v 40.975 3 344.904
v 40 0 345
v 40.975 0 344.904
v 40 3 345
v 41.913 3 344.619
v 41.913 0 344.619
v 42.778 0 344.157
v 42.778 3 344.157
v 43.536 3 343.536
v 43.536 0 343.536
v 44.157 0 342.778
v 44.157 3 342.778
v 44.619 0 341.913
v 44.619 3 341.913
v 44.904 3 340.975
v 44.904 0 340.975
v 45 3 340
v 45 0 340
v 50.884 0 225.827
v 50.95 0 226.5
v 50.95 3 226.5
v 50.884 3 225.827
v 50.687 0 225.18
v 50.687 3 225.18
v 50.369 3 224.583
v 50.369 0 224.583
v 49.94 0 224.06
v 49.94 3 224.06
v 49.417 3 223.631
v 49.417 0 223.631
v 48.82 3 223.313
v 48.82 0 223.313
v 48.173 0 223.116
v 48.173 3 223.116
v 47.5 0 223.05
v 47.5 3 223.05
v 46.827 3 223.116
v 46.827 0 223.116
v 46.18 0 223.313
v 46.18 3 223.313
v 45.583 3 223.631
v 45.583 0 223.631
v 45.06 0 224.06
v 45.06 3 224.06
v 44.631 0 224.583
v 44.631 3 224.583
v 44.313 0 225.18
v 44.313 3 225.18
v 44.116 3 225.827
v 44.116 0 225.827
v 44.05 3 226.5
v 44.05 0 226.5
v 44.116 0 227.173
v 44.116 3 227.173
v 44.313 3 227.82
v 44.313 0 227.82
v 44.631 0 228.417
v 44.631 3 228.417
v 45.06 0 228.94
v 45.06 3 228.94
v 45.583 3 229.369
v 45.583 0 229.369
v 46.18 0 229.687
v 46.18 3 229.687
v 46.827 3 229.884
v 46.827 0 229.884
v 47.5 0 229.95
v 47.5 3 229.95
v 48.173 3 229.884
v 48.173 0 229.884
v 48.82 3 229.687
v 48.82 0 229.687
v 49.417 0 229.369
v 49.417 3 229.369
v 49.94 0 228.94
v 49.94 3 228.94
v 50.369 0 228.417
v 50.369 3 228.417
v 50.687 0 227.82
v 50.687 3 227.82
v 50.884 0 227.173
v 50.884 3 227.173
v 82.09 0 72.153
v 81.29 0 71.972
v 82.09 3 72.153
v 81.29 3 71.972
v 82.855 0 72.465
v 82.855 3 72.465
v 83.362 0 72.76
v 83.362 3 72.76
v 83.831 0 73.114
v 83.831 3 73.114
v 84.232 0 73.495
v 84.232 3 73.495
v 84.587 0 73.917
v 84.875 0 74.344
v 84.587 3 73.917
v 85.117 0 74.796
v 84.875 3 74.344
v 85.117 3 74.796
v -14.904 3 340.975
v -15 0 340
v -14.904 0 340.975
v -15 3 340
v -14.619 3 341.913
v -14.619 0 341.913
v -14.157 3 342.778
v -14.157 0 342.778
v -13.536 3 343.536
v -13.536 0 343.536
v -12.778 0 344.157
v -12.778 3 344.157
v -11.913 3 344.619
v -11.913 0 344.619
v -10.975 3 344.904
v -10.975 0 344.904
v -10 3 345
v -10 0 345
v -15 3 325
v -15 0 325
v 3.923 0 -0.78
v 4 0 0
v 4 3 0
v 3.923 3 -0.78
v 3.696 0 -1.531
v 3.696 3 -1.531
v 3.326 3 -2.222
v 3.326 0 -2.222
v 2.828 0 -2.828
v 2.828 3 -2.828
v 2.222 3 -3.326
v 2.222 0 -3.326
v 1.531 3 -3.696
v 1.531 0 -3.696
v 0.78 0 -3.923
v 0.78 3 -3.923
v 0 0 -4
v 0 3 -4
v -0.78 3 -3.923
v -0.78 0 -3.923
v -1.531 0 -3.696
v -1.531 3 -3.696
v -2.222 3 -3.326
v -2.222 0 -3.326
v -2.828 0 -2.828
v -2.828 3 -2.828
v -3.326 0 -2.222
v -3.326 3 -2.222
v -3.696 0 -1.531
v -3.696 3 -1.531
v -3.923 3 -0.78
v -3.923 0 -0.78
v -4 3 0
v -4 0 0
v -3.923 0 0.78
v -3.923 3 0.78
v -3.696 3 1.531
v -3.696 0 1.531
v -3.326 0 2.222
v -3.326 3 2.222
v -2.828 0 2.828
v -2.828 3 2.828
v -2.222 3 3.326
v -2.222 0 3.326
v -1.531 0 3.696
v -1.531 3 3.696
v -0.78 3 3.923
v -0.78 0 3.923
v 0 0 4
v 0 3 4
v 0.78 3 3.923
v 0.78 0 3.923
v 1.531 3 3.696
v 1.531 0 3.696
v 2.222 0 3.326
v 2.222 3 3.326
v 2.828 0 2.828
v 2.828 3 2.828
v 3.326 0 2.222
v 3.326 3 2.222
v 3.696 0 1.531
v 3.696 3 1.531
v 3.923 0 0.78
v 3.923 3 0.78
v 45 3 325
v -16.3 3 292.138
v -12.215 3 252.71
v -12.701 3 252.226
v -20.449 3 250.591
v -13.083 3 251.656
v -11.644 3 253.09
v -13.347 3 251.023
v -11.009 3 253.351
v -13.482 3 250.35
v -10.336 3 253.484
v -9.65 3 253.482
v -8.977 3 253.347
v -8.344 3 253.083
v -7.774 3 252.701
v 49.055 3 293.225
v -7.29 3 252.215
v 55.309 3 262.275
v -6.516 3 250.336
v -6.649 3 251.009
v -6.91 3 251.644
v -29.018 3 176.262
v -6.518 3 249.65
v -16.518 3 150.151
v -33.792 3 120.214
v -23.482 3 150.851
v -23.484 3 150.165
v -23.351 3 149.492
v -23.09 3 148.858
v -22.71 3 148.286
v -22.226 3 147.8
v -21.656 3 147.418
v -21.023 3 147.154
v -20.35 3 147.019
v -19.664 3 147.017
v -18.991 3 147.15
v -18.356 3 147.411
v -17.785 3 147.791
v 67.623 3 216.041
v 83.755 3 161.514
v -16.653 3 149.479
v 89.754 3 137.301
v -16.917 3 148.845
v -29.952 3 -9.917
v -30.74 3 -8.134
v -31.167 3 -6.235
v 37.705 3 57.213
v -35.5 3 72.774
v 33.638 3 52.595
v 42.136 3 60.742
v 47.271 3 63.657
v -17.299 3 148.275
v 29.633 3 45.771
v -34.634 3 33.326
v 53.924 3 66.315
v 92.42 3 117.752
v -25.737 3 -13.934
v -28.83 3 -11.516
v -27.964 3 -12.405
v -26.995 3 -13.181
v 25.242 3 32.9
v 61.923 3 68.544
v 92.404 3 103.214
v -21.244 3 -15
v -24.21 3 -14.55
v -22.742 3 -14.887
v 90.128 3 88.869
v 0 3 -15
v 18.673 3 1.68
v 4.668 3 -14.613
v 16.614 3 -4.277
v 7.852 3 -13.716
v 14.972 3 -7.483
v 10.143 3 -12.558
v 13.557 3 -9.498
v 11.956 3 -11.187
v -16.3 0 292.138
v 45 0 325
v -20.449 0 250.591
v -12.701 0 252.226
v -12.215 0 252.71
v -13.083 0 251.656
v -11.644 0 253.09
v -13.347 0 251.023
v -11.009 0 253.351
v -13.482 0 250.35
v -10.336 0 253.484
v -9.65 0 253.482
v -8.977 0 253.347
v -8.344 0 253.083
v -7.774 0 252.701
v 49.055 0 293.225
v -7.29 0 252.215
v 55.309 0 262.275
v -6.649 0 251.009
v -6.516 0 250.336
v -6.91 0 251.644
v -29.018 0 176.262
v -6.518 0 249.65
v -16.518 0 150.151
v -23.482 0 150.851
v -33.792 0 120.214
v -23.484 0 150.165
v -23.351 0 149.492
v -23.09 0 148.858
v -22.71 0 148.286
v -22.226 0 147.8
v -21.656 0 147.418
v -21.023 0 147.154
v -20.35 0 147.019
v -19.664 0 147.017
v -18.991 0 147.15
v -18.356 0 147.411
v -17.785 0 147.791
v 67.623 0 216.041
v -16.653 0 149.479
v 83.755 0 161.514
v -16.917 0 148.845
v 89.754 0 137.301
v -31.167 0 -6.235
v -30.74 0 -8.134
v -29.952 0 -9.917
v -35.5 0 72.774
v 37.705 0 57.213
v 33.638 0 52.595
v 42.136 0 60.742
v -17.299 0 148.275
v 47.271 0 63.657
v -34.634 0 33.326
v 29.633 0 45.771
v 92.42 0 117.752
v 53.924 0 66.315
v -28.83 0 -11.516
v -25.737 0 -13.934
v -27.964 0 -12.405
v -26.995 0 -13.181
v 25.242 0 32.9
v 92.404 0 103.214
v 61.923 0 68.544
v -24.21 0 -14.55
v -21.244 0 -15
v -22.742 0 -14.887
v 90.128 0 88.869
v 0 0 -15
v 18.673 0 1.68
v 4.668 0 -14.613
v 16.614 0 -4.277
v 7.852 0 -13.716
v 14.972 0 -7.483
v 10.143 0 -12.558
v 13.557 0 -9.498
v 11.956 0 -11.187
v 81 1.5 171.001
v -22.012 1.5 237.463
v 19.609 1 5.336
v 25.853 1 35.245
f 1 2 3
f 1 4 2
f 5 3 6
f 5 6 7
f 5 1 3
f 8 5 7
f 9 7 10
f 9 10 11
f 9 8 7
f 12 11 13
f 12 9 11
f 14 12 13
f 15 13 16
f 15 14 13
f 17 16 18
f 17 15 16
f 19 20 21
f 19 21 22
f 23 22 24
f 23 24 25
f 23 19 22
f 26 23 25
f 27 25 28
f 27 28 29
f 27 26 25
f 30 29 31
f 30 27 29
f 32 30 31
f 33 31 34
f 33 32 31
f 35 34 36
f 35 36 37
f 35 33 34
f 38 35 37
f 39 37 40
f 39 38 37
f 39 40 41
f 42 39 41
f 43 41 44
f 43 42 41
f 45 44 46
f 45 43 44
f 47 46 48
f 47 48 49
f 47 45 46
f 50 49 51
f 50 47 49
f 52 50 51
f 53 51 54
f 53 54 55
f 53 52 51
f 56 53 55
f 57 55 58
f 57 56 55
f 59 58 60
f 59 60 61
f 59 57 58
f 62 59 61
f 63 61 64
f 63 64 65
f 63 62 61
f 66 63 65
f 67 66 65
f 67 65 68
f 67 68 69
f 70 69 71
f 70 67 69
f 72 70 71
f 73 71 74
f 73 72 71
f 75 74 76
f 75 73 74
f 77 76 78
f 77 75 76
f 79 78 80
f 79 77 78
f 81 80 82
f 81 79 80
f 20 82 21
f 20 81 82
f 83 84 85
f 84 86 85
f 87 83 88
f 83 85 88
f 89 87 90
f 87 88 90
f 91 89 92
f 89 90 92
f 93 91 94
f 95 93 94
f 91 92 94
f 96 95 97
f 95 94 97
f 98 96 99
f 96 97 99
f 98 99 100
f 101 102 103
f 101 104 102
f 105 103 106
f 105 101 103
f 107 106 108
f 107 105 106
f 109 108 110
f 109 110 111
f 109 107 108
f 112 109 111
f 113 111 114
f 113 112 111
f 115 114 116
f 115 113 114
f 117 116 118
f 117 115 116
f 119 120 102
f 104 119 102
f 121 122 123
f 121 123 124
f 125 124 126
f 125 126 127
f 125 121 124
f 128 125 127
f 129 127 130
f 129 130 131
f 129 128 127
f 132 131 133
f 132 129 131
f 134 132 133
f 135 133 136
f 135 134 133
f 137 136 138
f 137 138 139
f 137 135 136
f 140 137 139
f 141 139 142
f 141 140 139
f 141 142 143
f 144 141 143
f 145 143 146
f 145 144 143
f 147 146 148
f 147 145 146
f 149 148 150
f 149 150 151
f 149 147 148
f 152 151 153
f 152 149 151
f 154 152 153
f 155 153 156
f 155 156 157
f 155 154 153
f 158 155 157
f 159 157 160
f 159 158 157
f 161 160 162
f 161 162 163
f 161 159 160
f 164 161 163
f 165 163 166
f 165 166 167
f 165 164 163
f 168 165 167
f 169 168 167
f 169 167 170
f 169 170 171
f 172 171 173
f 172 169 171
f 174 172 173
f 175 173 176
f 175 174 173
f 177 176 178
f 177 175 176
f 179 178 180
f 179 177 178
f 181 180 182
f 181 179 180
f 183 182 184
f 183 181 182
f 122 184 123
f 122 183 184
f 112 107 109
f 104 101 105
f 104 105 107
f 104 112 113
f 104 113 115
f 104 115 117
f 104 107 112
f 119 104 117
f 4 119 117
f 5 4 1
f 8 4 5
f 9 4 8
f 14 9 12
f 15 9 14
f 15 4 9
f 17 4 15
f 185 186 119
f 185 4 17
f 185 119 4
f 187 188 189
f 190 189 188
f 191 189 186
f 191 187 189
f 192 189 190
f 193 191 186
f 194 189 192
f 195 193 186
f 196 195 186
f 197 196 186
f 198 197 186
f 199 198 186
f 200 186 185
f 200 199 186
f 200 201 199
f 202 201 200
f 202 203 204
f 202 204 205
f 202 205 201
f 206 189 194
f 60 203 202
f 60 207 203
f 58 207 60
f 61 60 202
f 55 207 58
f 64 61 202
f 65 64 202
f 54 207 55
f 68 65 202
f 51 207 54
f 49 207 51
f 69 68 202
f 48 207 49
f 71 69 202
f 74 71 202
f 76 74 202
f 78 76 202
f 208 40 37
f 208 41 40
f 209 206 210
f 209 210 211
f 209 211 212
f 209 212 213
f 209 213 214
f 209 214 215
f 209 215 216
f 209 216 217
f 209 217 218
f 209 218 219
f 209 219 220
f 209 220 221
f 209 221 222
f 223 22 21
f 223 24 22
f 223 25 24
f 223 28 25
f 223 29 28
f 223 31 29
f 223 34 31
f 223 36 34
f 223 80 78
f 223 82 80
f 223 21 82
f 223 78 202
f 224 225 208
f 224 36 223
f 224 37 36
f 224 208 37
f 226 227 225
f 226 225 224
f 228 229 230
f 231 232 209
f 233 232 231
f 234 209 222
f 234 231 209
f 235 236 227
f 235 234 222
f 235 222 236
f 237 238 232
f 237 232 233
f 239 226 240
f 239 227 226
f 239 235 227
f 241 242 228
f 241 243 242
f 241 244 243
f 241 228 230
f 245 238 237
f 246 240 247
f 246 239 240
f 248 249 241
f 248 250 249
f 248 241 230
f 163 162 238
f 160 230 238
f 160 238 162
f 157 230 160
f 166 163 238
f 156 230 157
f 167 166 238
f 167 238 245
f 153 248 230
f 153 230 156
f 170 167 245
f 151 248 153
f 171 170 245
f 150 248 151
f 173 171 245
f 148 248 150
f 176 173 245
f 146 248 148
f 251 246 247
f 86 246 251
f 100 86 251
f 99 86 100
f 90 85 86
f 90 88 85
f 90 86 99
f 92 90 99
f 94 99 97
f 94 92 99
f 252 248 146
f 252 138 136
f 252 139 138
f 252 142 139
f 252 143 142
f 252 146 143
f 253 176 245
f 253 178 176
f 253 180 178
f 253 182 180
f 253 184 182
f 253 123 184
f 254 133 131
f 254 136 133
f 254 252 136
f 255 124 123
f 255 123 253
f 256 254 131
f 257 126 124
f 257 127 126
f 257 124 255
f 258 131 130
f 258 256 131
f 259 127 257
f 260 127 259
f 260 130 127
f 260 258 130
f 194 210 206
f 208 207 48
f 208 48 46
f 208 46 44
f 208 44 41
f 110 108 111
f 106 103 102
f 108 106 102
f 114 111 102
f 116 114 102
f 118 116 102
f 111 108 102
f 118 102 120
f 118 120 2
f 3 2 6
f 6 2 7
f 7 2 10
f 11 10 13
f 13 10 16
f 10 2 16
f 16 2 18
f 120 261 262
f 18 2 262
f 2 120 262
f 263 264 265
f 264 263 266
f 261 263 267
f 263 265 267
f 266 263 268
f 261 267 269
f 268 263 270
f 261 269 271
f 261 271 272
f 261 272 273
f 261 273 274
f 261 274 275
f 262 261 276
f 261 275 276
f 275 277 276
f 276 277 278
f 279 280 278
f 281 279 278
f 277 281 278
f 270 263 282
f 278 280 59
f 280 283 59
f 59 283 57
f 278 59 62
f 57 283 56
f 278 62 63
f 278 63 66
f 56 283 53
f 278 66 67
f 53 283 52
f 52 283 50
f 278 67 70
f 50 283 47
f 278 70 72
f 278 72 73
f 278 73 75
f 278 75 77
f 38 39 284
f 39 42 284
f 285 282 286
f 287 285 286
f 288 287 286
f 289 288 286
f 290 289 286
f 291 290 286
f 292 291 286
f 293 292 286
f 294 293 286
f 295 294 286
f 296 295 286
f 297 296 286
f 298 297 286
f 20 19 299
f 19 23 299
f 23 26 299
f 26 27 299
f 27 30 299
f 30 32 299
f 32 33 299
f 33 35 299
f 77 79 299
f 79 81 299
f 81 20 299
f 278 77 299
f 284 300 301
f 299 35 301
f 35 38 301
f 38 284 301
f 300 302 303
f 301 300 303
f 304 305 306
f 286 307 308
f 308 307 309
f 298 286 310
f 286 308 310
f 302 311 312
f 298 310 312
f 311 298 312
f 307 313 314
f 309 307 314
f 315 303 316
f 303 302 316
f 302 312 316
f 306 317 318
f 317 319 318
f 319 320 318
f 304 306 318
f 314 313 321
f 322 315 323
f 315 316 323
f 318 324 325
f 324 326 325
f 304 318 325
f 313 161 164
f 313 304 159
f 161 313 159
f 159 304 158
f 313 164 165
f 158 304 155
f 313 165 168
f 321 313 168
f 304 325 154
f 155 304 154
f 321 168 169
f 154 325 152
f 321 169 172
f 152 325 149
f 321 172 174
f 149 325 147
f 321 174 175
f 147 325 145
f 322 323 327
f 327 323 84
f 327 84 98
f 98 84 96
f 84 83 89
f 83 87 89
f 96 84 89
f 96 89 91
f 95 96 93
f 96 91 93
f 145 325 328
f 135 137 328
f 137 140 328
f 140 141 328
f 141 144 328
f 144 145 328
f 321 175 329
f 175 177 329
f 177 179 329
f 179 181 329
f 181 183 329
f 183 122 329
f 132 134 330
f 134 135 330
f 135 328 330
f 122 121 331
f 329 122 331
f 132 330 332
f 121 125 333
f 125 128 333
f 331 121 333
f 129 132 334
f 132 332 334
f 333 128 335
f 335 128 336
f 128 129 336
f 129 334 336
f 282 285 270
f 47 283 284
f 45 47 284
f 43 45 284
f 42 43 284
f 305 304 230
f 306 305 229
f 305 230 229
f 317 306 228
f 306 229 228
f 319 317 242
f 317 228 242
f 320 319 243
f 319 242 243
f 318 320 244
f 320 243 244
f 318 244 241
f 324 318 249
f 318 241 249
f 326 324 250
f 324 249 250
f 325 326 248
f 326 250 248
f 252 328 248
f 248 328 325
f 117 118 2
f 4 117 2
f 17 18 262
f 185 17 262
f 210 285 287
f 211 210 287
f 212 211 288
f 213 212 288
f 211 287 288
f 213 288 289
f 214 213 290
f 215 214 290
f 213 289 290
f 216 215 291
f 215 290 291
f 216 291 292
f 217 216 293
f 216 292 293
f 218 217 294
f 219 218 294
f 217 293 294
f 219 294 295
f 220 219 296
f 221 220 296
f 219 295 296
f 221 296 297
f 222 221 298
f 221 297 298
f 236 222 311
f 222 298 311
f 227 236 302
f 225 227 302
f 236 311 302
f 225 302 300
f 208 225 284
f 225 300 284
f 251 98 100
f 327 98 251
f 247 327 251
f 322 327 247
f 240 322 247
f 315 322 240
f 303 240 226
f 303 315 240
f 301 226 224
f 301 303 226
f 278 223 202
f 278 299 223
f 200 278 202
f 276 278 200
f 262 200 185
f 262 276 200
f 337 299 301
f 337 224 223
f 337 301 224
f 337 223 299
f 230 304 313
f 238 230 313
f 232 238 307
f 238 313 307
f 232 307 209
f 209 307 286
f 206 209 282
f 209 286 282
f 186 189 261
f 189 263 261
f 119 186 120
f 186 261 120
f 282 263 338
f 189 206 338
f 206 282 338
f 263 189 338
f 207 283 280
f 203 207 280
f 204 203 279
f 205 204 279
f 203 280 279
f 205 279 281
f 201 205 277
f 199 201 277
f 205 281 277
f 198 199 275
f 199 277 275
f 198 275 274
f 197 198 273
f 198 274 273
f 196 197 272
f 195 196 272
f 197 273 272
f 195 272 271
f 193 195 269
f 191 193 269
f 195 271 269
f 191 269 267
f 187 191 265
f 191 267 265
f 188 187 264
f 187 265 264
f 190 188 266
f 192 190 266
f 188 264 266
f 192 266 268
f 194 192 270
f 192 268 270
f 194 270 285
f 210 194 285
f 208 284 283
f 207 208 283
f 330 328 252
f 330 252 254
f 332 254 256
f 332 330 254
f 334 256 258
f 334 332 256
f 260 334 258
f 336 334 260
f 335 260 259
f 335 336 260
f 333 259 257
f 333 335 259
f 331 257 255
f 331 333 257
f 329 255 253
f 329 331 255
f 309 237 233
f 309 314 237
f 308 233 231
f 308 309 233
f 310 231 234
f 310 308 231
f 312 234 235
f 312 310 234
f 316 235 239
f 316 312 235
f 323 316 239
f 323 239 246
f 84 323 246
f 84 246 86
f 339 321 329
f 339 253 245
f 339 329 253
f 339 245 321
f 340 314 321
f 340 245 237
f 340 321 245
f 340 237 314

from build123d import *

# Parameters (mm, degrees)
SKETCH1_R           = 4
SKETCH1_R_2         = 3.45
BOSS_EXTRUDE1_DEPTH = 3
FILLET1_R           = 5
FILLET2_R           = 10


with BuildPart() as part:
    # Sketch1 → Boss-Extrude1 (new body)
    with BuildSketch(Plane(origin=(0, 0, 0), x_dir=(1, 0, 0), z_dir=(0, 1, 0))):
        with BuildLine():
            Line((-15, -325), (-15, -345))
            Line((-15, -345), (45, -345))
            Line((45, -345), (45, -325))
            add(Edge.make_bspline(
                [(83.906024568, -72.334193472), (100.067703513, -103.783632704), (75.99628029, -191.959172621), (49.567481947, -271.364145728), (45, -325)],
                knots=[0, 0, 0, 0, 0.388668159, 1, 1, 1, 1], degree=3))
            add(Edge.make_bspline(
                [(0, 15), (11.859468256, 15), (19.027998929, 4.991144095), (28.068840843, -60.357487218), (48.218476882, -67.479548025), (83.906024568, -72.334193472)],
                knots=[0, 0, 0, 0, 0.292385063, 0.473698528, 1, 1, 1, 1], degree=3))
            Line((0, 15), (-30, 15))
            add(Edge.make_bspline(
                [(-30, 15), (-42.027894854, -69.718453242), (-28.647636574, -182.406317953), (-15, -295.84878712), (-15, -325)],
                knots=[0, 0, 0, 0, 0.742442908, 1, 1, 1, 1], degree=3))
        make_face()
        Circle(SKETCH1_R, mode=Mode.SUBTRACT)
        with Locations((47.5, -226.5)):
            Circle(SKETCH1_R_2, mode=Mode.SUBTRACT)
        with BuildLine():
            Line((-13.48245603, -250.35), (-23.48245603, -150.851256289))
            ThreePointArc((-23.48245603, -150.851256289), (-20.35, -147.018800259), (-16.51754397, -150.151256289))
            Line((-16.51754397, -150.151256289), (-6.51754397, -249.65))
            ThreePointArc((-6.51754397, -249.65), (-9.65, -253.48245603), (-13.48245603, -250.35))
        make_face(mode=Mode.SUBTRACT)
    extrude(amount=BOSS_EXTRUDE1_DEPTH)

    # Fillet1
    fillet1_edges = [part.edges().sort_by_distance(p)[0] for p in [
        (83.906024568, 1.5, 72.334193472),
        (45, 1.5, 345),
        (-15, 1.5, 345),
    ]]
    fillet(fillet1_edges, radius=FILLET1_R)

    # Fillet2
    fillet2_edges = [part.edges().sort_by_distance(p)[0] for p in [
        (-30, 1.5, -15),
    ]]
    fillet(fillet2_edges, radius=FILLET2_R)


solid = part.part
